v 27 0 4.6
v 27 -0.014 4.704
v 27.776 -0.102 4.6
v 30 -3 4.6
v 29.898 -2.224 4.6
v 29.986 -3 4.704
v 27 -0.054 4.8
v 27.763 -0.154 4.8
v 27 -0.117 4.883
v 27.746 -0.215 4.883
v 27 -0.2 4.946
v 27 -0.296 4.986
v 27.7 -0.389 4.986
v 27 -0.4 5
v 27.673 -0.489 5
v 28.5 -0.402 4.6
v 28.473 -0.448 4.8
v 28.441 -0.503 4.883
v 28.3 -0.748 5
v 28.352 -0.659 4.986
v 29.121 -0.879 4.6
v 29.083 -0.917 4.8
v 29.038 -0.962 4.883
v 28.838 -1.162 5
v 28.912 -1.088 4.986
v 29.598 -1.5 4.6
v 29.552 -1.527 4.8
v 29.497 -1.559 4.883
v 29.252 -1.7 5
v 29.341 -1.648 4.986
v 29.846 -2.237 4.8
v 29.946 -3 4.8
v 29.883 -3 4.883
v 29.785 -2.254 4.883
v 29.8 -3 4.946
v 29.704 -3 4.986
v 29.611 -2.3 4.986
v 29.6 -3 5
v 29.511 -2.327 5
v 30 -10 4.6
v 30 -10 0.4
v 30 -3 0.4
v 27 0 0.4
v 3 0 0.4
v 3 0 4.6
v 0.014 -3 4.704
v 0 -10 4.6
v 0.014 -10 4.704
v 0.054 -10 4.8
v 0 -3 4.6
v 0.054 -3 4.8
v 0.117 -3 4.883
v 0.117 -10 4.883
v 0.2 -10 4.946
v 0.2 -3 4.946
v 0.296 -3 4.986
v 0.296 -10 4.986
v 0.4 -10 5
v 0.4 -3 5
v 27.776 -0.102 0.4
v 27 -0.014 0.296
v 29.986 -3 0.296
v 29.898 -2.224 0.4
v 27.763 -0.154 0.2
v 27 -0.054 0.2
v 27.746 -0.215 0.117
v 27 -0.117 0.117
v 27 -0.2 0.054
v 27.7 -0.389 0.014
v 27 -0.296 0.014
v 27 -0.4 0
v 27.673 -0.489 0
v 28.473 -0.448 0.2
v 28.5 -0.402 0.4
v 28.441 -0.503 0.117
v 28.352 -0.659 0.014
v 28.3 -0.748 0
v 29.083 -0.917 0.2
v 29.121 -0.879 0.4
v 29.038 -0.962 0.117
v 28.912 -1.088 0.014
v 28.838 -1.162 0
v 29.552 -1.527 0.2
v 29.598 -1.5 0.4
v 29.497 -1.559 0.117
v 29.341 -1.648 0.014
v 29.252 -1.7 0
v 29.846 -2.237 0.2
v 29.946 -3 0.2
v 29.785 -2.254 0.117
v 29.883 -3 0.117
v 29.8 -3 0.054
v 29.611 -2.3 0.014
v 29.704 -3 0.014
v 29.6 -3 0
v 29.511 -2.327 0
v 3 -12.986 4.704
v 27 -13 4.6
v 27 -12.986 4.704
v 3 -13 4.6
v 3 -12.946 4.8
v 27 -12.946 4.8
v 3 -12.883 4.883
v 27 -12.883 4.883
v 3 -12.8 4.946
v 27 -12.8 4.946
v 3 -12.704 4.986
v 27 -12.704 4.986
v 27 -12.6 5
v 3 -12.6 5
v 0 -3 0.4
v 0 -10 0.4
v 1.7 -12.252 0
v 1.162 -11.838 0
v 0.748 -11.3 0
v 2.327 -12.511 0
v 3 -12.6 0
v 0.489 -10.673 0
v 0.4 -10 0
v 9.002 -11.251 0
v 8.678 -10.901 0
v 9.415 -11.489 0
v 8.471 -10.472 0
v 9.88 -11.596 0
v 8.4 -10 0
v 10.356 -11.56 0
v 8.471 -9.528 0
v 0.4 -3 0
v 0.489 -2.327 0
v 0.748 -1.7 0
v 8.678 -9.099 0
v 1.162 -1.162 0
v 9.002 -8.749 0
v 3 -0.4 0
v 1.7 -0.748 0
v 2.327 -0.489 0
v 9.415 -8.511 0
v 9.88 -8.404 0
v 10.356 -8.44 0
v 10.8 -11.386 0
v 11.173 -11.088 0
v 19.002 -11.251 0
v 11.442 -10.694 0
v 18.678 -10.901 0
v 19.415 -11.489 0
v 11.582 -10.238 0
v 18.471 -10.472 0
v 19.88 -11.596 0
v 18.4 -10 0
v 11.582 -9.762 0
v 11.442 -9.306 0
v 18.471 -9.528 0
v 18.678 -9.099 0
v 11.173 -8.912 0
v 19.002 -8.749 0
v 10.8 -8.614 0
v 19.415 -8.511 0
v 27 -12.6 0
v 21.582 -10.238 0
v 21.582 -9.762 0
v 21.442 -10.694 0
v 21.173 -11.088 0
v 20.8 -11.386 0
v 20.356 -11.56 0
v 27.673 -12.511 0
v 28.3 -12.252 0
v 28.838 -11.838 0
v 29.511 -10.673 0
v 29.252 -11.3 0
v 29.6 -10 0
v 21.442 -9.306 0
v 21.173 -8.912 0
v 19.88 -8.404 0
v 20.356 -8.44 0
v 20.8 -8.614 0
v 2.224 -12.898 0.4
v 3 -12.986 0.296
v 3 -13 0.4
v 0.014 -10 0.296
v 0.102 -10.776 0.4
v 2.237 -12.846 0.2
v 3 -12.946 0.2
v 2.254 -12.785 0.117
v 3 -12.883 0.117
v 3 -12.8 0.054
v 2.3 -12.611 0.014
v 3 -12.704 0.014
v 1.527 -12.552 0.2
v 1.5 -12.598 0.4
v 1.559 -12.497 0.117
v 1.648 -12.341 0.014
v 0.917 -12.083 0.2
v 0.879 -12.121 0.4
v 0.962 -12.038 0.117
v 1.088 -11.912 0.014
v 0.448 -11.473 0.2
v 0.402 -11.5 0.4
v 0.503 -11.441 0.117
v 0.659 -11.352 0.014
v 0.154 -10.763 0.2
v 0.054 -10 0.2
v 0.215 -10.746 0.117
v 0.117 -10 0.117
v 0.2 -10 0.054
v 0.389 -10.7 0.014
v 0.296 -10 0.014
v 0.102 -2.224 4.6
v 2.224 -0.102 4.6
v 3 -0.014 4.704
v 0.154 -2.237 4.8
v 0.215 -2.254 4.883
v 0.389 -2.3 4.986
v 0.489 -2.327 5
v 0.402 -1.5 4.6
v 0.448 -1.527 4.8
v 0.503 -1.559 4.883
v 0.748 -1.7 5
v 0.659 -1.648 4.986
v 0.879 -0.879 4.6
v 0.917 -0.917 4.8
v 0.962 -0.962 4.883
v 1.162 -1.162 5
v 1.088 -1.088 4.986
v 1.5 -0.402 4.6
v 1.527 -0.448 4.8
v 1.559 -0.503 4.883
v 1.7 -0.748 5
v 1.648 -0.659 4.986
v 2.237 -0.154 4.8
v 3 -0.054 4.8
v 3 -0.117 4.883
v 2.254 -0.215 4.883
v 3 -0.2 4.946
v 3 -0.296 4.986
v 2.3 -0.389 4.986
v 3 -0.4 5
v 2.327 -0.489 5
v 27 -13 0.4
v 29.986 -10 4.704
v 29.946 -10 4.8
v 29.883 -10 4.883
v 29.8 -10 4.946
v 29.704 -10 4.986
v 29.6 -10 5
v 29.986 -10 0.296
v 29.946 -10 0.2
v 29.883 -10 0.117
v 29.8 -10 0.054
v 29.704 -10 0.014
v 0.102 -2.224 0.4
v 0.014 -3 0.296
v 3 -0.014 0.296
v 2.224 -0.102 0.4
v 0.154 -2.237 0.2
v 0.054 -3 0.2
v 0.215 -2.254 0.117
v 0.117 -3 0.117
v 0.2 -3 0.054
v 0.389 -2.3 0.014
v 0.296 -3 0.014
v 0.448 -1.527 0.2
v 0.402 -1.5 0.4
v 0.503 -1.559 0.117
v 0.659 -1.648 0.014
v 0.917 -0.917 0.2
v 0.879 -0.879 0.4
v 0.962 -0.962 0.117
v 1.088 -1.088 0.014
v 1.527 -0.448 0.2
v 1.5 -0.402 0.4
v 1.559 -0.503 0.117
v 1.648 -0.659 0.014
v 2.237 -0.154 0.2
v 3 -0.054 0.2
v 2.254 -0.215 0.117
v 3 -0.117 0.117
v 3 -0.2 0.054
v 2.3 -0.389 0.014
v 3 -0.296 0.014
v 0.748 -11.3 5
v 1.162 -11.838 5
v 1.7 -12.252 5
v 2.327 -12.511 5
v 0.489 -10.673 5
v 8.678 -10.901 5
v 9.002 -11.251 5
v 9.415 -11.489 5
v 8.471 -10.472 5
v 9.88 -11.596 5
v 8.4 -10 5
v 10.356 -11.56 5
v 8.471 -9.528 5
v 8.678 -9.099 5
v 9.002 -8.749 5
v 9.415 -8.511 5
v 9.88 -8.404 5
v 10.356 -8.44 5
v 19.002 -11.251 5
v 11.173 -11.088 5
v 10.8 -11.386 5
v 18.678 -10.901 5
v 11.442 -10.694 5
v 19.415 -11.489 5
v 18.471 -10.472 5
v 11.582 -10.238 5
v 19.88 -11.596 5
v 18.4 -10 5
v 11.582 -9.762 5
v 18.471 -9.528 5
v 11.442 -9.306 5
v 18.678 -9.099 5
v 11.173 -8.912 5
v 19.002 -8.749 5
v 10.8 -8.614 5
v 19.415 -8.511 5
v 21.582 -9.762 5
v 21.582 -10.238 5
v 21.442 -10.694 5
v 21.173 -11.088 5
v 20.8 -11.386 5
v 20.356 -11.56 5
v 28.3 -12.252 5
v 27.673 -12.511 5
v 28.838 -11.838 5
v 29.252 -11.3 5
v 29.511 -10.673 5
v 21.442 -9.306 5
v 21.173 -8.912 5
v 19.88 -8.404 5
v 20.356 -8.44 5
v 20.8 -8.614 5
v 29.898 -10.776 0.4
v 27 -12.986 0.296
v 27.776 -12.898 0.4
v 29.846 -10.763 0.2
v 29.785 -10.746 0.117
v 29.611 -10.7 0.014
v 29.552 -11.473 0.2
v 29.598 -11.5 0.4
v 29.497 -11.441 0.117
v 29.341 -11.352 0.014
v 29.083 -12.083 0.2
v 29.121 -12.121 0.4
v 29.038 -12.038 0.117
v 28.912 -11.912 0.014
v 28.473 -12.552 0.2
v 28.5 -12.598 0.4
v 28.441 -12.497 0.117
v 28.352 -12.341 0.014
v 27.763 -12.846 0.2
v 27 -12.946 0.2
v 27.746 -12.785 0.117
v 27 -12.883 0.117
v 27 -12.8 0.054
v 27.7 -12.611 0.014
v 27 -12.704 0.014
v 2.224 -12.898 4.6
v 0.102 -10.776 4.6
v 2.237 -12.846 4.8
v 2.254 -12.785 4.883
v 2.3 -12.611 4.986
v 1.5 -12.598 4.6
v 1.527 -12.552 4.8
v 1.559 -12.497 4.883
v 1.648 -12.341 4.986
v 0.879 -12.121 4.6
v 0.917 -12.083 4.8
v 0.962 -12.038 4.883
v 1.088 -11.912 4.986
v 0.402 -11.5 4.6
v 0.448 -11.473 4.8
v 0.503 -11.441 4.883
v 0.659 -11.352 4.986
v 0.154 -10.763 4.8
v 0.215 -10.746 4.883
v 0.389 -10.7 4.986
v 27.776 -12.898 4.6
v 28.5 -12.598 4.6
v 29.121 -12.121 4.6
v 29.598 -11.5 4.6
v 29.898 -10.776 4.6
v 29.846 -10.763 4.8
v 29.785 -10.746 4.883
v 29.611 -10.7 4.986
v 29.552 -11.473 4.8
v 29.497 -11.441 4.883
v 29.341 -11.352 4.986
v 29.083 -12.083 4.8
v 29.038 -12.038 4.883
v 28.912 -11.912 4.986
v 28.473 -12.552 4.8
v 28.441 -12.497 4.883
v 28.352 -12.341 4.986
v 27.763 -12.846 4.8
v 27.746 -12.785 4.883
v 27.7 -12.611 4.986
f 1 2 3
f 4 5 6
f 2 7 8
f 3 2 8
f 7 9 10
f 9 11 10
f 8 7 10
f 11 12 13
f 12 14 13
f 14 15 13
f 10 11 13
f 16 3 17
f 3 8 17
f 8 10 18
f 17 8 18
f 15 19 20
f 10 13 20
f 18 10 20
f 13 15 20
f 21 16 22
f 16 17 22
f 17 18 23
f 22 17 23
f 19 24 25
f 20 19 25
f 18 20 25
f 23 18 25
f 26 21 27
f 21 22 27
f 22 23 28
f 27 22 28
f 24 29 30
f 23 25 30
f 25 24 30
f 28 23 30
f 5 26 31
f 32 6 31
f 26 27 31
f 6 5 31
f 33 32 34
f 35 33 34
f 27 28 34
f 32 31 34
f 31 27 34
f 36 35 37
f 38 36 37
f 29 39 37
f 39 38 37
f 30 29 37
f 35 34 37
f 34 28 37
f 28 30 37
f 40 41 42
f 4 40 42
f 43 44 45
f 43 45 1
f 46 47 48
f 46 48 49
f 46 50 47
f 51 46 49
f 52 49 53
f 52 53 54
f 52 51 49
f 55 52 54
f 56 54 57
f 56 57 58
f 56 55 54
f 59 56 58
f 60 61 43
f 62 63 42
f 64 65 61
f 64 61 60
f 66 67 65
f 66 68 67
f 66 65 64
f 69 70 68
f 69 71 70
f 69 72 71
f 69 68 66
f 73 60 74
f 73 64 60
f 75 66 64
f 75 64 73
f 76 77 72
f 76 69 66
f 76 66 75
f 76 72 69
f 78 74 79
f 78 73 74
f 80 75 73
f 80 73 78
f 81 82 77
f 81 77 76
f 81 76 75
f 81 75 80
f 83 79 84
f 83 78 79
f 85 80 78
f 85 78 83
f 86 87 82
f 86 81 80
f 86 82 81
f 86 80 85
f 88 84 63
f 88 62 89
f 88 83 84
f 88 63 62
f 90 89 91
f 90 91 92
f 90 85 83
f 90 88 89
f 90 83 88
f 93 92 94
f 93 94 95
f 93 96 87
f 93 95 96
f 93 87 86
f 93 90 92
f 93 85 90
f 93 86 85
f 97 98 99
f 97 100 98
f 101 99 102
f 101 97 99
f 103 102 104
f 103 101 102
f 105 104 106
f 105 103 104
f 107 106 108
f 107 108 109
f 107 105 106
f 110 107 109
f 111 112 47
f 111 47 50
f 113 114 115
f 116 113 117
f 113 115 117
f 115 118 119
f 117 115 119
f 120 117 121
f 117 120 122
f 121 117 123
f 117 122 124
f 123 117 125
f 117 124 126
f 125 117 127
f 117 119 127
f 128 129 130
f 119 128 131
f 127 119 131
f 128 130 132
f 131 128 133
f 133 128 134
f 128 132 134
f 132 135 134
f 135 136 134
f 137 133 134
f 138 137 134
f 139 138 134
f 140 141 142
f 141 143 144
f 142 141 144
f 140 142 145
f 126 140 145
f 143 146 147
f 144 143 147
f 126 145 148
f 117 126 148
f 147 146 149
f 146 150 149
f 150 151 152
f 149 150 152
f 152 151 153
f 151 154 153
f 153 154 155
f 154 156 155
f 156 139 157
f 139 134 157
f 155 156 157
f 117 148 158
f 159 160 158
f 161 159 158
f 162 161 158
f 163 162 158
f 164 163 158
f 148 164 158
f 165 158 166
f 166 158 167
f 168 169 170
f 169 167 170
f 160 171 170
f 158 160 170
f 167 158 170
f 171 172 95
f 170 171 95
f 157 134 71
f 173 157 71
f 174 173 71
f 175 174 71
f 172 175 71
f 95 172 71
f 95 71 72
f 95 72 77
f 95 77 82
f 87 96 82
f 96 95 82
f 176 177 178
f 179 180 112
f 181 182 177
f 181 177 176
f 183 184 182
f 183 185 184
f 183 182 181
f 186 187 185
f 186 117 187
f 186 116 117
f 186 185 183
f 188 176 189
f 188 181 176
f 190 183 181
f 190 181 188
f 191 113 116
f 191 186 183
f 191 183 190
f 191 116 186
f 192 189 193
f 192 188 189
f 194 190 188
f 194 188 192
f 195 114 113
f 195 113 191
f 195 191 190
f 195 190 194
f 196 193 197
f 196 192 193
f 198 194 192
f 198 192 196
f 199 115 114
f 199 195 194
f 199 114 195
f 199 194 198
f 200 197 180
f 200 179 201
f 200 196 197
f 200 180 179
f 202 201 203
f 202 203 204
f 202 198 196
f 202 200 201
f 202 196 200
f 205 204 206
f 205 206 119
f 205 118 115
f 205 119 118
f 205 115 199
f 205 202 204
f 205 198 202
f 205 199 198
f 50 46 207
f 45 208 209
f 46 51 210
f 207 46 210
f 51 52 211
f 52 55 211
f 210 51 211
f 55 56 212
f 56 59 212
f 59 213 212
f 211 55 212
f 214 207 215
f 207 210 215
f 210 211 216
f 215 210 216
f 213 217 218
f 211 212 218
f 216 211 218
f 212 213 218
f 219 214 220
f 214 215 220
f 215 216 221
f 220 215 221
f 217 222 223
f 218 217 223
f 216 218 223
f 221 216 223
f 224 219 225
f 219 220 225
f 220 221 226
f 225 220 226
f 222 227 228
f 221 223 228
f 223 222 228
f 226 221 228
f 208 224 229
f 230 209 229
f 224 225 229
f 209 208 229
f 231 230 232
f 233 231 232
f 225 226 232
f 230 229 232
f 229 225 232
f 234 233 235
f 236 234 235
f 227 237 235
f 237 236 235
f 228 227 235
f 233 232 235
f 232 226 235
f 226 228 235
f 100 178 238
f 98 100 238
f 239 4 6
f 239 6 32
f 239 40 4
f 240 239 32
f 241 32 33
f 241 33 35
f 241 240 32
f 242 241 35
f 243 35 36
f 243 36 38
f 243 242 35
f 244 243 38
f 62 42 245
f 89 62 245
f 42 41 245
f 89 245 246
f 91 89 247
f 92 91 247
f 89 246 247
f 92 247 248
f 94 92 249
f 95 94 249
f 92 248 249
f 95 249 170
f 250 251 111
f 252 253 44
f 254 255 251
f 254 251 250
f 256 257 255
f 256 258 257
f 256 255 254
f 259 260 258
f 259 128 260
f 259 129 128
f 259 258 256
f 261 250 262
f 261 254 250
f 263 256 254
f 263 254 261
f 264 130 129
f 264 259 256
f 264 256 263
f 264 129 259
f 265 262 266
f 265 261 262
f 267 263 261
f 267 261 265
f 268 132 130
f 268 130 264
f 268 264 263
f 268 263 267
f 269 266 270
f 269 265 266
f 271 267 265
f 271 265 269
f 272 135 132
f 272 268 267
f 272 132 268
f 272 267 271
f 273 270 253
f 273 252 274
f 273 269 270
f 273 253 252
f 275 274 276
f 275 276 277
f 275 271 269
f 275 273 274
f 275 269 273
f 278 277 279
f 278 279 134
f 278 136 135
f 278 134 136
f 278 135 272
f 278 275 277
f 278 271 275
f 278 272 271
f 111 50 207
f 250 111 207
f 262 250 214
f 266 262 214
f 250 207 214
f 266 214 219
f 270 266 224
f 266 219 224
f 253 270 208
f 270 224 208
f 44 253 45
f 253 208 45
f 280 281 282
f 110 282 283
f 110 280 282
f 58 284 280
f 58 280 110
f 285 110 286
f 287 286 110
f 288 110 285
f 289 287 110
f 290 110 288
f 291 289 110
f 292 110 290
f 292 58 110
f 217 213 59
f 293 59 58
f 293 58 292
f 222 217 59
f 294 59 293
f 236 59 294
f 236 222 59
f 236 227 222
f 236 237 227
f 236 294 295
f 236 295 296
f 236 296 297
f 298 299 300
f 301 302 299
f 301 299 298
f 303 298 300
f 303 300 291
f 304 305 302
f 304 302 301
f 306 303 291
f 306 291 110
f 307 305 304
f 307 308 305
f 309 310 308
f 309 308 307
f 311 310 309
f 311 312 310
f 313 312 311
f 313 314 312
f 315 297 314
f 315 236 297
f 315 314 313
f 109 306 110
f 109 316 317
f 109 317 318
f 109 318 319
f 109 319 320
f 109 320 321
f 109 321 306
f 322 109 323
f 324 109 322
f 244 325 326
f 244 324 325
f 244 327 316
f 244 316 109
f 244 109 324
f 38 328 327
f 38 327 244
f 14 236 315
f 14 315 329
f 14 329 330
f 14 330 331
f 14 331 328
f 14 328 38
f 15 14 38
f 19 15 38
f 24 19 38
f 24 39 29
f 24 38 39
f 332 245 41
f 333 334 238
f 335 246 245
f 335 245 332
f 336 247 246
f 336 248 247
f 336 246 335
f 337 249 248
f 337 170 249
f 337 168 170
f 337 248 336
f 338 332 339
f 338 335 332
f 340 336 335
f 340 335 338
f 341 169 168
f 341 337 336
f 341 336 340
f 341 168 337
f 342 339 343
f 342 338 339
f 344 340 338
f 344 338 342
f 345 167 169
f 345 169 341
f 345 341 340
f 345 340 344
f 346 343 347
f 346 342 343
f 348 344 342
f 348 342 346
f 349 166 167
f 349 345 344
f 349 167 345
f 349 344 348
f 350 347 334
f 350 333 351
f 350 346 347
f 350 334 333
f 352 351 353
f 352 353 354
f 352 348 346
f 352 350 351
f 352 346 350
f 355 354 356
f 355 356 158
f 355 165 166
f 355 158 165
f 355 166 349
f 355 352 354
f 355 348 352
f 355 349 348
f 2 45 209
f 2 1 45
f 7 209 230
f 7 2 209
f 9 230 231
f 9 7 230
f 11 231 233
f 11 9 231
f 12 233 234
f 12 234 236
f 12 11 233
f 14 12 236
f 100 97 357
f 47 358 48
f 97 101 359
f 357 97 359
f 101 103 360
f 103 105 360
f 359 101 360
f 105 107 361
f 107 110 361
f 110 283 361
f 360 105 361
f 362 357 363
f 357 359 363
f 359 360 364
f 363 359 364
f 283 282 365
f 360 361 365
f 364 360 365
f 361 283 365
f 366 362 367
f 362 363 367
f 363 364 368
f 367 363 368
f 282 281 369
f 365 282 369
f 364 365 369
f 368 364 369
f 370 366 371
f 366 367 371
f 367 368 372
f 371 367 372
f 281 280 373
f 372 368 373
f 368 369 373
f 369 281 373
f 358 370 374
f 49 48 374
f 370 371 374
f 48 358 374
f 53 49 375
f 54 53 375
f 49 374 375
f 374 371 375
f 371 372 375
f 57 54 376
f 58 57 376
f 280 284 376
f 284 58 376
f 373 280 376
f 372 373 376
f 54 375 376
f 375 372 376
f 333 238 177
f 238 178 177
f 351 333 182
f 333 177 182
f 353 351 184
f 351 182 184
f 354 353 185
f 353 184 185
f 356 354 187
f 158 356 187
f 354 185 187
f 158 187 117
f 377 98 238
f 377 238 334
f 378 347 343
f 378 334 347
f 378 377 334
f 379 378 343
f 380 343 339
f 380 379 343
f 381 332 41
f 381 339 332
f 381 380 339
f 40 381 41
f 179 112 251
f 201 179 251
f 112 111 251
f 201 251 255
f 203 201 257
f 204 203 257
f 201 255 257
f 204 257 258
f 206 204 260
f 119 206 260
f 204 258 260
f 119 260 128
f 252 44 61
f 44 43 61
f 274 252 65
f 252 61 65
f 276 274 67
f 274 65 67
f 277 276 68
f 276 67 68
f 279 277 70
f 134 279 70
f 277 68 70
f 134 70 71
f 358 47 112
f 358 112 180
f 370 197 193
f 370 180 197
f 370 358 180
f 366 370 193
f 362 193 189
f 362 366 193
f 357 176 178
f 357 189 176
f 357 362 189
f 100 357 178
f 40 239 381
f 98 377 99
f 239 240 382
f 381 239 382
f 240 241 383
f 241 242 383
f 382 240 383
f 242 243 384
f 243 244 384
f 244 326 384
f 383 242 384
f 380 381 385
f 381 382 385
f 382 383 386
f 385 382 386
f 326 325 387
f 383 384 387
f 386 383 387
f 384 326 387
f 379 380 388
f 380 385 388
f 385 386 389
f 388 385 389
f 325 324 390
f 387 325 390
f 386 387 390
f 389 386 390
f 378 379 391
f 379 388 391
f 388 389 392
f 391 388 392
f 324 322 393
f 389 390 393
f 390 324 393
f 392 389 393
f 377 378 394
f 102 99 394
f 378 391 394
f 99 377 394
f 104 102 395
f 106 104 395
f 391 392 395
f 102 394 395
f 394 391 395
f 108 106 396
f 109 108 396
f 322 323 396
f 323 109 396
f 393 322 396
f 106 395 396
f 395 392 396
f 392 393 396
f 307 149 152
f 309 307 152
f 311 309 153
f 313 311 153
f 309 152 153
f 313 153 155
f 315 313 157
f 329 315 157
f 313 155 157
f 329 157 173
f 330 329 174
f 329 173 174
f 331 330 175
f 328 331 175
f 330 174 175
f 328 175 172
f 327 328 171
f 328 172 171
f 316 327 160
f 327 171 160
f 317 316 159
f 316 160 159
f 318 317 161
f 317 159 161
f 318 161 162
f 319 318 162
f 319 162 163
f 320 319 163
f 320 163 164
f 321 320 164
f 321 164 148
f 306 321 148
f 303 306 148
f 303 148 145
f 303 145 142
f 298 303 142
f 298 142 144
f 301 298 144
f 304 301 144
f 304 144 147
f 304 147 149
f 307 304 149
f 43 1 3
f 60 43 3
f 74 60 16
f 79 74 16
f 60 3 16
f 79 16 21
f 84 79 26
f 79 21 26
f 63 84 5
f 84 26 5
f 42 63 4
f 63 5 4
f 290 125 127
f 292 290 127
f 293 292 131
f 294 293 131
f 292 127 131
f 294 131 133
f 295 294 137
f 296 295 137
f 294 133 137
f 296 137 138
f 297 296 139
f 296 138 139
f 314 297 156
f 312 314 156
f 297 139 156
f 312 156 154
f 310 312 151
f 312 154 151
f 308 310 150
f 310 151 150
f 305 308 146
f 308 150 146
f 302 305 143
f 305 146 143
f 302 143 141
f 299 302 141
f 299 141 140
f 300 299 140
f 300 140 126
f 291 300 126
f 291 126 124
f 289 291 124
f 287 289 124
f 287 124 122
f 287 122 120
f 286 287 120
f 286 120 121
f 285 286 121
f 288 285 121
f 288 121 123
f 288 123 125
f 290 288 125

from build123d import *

# Parameters (mm, degrees)
SKETCH1_W           = 30
SKETCH1_H           = 13
BOSS_EXTRUDE1_DEPTH = 5
SKETCH2_R           = 1.6
CUT_EXTRUDE1_DEPTH  = 34.075670817
FILLET1_R           = 3
FILLET2_R           = 0.4


with BuildPart() as part:
    # Sketch1 → Boss-Extrude1 (new body)
    with BuildSketch(Plane.XY):
        with Locations((15, -6.5)):
            Rectangle(SKETCH1_W, SKETCH1_H)
    extrude(amount=BOSS_EXTRUDE1_DEPTH)

    # Sketch2 → Cut-Extrude1 (cut, through all)
    with BuildSketch(Plane(origin=(0, 0, 0), x_dir=(-1, 0, 0), z_dir=(0, 0, -1))):
        with Locations((-20, -10)):
            Circle(SKETCH2_R)
        with Locations((-10, -10)):
            Circle(SKETCH2_R)
    extrude(amount=-CUT_EXTRUDE1_DEPTH, mode=Mode.SUBTRACT)

    # Fillet1
    fillet1_edges = [part.edges().sort_by_distance(p)[0] for p in [
        (0, 0, 2.5),
        (30, 0, 2.5),
        (30, -13, 2.5),
        (0, -13, 2.5),
    ]]
    fillet(fillet1_edges, radius=FILLET1_R)

    # Fillet2
    fillet2_edges = [part.edges().sort_by_distance(p)[0] for p in [
        (0, -6.5, 0),
        (0, -6.5, 5),
        (15, 0, 0),
        (30, -6.5, 0),
        (15, -13, 0),
        (29.121320344, -0.878679656, 0),
        (29.121320344, -12.121320344, 0),
        (0.878679656, -12.121320344, 0),
        (0.878679656, -0.878679656, 0),
        (15, 0, 5),
        (15, -13, 5),
        (30, -6.5, 5),
        (29.121320344, -0.878679656, 5),
        (29.121320344, -12.121320344, 5),
        (0.878679656, -12.121320344, 5),
        (0.878679656, -0.878679656, 5),
    ]]
    fillet(fillet2_edges, radius=FILLET2_R)


solid = part.part
